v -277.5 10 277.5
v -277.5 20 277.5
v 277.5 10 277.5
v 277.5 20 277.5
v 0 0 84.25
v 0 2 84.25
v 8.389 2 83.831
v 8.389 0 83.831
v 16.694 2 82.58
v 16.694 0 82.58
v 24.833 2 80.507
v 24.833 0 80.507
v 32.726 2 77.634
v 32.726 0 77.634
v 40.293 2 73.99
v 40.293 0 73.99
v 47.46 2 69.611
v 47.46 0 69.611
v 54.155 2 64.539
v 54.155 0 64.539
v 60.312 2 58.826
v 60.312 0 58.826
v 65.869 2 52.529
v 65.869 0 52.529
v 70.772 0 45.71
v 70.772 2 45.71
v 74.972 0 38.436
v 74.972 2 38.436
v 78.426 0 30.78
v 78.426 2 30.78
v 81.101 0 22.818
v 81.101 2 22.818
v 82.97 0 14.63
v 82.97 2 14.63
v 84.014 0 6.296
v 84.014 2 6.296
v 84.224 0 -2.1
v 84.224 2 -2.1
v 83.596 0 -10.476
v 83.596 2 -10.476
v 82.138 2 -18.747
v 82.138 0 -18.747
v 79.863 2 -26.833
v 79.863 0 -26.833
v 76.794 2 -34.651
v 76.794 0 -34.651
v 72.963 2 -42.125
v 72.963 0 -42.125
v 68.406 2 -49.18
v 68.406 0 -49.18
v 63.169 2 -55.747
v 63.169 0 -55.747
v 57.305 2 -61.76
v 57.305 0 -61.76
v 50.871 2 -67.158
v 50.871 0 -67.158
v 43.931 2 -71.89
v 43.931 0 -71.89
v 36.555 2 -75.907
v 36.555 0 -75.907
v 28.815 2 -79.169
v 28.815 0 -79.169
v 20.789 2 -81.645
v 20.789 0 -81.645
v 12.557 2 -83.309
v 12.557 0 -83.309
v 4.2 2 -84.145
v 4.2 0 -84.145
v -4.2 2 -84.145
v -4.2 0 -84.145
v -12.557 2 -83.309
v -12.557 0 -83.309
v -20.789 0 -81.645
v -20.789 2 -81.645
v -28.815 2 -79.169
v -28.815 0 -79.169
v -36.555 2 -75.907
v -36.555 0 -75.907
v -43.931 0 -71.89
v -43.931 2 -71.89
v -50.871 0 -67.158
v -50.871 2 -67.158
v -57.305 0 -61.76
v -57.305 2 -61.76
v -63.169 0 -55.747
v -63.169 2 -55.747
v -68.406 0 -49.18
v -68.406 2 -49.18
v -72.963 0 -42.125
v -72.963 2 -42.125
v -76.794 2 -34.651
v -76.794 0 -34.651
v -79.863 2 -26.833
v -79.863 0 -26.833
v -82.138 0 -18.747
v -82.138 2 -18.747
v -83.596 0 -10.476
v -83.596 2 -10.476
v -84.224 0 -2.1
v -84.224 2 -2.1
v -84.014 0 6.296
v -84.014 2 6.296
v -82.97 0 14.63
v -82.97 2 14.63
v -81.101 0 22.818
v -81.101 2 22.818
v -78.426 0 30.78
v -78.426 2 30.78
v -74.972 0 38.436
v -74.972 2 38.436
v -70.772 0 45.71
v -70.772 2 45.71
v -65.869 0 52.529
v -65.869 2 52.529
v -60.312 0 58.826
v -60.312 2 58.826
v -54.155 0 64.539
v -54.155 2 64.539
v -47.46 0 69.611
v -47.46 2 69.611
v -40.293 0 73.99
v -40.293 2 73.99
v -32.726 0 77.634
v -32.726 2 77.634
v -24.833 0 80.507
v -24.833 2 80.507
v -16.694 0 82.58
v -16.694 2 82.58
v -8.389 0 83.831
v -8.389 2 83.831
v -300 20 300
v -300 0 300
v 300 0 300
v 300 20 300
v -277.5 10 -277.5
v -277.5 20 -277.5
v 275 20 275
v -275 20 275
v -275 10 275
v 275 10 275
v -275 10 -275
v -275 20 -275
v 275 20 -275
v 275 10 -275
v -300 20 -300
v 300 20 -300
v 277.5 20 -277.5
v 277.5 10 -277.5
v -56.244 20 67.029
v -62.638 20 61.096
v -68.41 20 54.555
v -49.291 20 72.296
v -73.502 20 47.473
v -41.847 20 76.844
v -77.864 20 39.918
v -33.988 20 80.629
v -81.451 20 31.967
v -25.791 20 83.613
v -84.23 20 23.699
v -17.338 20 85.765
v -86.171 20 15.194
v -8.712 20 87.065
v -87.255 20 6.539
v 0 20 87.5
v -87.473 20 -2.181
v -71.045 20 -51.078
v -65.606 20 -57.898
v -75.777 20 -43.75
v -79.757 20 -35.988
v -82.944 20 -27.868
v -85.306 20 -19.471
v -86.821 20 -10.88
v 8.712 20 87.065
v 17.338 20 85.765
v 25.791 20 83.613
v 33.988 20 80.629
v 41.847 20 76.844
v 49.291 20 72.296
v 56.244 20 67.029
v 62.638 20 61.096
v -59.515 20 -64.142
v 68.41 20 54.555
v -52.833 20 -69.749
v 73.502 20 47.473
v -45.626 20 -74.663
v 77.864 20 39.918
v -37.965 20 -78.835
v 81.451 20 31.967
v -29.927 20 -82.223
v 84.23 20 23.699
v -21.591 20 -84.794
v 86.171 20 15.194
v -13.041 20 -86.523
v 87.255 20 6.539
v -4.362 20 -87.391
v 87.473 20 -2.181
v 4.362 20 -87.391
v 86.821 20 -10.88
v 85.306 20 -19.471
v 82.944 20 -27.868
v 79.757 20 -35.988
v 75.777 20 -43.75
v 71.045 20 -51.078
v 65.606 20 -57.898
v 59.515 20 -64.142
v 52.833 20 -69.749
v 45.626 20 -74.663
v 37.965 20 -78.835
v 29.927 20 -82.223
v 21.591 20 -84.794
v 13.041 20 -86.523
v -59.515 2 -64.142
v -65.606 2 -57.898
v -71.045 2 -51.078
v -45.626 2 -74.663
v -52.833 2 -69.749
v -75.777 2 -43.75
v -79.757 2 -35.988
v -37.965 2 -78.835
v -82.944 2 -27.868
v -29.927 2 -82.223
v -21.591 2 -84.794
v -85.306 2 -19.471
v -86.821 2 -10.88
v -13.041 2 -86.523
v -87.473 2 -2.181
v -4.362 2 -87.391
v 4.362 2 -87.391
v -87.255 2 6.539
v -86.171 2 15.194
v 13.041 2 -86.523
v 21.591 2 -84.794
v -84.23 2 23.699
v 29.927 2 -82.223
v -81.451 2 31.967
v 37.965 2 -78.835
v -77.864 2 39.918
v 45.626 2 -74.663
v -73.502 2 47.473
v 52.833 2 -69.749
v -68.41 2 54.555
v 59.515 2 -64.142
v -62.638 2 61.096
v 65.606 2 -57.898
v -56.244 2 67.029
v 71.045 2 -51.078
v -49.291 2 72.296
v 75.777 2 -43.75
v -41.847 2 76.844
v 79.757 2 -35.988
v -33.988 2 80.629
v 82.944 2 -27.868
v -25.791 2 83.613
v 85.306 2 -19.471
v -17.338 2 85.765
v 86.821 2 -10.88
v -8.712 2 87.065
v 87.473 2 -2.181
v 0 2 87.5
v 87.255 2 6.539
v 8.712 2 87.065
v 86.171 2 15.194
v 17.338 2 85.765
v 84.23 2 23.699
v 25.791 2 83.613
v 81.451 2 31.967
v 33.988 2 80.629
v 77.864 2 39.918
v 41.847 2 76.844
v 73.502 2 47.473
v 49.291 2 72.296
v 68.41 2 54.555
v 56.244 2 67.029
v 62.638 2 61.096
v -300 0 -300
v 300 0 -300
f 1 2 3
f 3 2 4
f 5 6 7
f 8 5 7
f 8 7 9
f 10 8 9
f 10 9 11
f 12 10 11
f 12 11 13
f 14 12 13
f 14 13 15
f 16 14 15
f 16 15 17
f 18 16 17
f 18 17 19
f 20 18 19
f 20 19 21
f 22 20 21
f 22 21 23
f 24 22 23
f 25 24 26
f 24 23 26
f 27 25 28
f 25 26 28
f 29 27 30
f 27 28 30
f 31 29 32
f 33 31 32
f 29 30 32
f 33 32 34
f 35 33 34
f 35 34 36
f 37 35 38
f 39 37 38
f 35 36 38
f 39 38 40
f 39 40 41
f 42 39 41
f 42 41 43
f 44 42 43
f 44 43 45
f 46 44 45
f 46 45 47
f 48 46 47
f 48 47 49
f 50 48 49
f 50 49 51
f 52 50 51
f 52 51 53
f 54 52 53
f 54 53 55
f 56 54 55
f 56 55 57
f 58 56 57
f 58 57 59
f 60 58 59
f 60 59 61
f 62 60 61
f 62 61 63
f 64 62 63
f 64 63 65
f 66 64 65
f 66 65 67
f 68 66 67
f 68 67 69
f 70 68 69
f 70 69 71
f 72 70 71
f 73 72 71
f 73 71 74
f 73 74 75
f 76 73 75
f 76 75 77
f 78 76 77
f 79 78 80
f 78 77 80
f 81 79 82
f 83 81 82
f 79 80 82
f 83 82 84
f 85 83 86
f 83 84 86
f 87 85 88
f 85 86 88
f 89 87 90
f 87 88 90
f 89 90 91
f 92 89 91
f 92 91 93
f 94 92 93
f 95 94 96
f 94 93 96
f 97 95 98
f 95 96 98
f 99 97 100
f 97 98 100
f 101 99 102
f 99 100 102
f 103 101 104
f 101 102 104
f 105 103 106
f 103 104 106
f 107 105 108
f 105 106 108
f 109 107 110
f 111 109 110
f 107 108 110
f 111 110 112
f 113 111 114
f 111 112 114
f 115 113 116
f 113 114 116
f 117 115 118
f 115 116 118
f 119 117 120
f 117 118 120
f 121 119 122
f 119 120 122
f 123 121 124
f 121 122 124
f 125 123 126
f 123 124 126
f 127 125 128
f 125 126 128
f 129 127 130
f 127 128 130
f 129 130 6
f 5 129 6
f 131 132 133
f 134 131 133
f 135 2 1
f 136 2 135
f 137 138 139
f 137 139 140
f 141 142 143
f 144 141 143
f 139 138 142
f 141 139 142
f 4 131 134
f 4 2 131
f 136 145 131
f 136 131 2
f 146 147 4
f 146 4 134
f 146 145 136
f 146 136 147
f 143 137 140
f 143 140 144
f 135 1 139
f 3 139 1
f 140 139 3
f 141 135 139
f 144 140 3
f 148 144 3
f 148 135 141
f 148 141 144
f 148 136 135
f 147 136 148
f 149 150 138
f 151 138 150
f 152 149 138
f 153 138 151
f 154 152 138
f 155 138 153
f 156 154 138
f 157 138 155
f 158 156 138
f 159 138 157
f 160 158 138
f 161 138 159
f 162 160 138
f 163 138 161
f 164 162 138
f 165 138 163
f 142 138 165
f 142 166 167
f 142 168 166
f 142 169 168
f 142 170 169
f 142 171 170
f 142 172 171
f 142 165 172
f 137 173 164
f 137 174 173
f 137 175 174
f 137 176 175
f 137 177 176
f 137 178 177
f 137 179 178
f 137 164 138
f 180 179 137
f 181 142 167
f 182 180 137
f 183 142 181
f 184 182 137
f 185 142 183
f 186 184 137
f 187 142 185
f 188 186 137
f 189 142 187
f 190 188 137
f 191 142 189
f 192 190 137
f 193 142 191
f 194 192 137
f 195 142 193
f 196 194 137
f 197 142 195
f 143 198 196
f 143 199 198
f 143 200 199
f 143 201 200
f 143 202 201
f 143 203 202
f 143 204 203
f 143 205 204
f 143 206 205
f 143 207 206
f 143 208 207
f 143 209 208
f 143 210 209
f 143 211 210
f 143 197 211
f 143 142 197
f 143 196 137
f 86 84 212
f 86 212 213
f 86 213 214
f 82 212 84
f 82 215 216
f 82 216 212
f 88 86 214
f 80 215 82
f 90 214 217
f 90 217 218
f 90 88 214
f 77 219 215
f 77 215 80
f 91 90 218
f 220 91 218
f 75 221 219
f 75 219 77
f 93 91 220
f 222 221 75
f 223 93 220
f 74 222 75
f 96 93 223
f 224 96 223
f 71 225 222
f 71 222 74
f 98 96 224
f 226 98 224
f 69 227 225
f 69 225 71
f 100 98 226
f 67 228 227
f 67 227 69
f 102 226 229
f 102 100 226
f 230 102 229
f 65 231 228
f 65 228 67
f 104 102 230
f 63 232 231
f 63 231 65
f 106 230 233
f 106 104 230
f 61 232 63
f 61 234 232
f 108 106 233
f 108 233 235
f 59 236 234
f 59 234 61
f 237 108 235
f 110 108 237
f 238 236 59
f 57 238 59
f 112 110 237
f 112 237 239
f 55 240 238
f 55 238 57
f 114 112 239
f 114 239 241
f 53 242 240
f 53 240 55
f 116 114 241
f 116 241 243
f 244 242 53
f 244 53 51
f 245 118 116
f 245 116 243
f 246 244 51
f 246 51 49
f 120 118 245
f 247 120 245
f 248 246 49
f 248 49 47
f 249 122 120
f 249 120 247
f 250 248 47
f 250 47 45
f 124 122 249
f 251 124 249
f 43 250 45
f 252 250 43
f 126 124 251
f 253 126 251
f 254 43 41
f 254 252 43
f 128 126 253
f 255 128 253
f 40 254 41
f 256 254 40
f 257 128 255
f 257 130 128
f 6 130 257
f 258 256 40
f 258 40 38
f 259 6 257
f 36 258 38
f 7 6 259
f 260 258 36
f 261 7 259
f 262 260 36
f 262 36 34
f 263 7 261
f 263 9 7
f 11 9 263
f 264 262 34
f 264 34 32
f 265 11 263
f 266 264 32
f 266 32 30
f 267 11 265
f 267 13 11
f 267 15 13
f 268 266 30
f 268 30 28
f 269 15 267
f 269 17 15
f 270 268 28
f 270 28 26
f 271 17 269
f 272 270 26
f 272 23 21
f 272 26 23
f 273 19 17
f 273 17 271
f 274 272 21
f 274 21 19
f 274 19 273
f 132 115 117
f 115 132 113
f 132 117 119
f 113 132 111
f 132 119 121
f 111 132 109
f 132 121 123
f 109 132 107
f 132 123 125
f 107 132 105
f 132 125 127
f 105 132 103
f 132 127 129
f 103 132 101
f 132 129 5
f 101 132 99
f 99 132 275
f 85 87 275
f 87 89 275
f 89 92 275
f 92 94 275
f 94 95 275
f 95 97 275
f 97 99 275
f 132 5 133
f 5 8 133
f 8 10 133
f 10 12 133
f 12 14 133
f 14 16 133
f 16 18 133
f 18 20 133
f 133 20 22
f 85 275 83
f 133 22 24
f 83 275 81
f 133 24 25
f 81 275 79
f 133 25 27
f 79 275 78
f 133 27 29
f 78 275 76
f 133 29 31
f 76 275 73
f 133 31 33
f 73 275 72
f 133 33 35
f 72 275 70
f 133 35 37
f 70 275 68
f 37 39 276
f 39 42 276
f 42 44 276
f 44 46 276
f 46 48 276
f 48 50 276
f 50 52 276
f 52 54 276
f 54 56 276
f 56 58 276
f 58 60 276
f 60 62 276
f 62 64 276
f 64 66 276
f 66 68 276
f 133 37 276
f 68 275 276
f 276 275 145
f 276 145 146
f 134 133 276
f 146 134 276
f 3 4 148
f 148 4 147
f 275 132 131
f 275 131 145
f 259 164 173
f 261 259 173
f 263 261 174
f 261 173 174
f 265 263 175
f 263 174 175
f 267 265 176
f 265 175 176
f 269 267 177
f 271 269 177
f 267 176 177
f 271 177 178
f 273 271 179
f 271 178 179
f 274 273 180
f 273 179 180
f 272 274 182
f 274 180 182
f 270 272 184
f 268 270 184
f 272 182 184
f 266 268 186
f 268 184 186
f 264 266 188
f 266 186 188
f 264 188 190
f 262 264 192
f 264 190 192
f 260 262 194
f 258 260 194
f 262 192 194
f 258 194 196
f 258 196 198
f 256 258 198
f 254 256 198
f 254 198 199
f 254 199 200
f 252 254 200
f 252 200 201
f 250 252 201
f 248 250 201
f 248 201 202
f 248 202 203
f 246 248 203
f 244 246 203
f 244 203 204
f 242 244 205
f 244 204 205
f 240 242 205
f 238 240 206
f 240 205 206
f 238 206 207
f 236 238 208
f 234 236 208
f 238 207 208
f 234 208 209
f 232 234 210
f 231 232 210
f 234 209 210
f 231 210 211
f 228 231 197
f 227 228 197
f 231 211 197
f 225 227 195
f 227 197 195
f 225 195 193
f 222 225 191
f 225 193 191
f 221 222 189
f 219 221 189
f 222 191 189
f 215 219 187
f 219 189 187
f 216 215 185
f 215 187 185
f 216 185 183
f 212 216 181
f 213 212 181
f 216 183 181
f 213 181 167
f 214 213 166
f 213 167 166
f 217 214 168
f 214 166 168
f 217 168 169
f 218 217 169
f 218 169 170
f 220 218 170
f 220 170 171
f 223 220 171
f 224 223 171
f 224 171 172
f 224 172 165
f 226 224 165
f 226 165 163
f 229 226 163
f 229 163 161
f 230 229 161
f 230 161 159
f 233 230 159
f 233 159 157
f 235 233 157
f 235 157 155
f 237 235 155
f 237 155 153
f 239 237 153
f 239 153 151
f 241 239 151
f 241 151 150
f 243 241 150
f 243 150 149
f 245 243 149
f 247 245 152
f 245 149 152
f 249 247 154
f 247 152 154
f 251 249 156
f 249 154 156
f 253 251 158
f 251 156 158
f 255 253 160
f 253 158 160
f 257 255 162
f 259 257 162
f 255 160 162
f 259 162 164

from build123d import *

# Parameters (mm, degrees)
SKETCH1_W          = 600
SKETCH1_H          = 600
PLATE_DEPTH        = 20
SKETCH2_R          = 87.5
BEARING_HOLE_DEPTH = 18
SKETCH3_R          = 84.25
CUT_EXTRUDE2_DEPTH = 18
SKETCH4_W          = 555
SKETCH4_H          = 555
SKETCH4_W_2        = 550
SKETCH4_H_2        = 550
CUT_EXTRUDE3_DEPTH = 10


with BuildPart() as part:
    # Sketch1 → plate (new body)
    with BuildSketch(Plane(origin=(0, 0, 0), x_dir=(1, 0, 0), z_dir=(0, 1, 0))):
        Rectangle(SKETCH1_W, SKETCH1_H)
    extrude(amount=PLATE_DEPTH)

    # Sketch2 → bearing-hole (cut)
    with BuildSketch(Plane(origin=(0, 20, 0), x_dir=(1, 0, 0), z_dir=(0, 1, 0))):
        with Locations(Location((0, 0, 0), (0, 0, 270))):
            Circle(SKETCH2_R)
    extrude(amount=-BEARING_HOLE_DEPTH, mode=Mode.SUBTRACT)

    # Sketch3 → Cut-Extrude2 (cut)
    with BuildSketch(Plane(origin=(0, 2, 0), x_dir=(1, 0, 0), z_dir=(0, 1, 0))):
        with Locations(Location((0, 0, 0), (0, 0, 270))):
            Circle(SKETCH3_R)
    extrude(amount=-CUT_EXTRUDE2_DEPTH, mode=Mode.SUBTRACT)

    # Sketch4 → Cut-Extrude3 (cut)
    with BuildSketch(Plane(origin=(0, 20, 0), x_dir=(1, 0, 0), z_dir=(0, 1, 0))):
        Rectangle(SKETCH4_W, SKETCH4_H)
        Rectangle(SKETCH4_W_2, SKETCH4_H_2, mode=Mode.SUBTRACT)
    extrude(amount=-CUT_EXTRUDE3_DEPTH, mode=Mode.SUBTRACT)


solid = part.part
